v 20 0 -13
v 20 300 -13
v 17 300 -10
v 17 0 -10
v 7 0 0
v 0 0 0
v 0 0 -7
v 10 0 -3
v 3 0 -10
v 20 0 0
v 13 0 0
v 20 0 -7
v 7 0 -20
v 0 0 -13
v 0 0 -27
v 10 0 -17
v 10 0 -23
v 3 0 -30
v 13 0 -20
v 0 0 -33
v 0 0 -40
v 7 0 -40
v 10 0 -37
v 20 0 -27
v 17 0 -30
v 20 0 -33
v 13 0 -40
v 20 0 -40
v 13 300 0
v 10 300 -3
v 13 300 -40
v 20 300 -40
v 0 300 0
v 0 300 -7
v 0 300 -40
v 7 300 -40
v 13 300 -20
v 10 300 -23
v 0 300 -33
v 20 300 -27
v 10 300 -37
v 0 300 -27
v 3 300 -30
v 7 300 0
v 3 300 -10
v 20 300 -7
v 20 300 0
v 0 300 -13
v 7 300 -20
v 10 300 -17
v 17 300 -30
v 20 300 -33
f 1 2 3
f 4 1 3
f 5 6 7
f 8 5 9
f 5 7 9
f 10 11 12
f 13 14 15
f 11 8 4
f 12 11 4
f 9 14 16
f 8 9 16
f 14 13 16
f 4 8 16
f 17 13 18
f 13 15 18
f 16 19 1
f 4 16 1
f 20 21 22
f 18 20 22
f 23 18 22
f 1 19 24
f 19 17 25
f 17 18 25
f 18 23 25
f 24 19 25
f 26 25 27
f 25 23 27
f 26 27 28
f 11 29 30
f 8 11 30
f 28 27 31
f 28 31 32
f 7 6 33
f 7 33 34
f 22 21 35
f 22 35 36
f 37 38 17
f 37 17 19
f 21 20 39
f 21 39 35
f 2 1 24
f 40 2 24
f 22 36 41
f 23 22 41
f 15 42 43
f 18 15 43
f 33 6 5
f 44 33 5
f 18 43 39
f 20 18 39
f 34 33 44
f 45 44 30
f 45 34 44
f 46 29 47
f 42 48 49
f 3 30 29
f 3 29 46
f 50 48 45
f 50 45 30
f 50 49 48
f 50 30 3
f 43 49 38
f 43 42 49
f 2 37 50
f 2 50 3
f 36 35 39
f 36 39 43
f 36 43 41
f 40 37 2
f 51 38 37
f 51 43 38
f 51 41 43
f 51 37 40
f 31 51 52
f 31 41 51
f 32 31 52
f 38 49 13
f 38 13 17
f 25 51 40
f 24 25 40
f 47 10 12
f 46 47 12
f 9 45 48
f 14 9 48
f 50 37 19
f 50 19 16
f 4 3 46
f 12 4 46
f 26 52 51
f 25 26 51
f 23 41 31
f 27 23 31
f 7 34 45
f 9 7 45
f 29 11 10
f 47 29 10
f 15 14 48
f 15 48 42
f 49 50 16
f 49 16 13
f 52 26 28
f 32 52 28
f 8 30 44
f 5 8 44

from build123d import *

# Parameters (mm, degrees)
SKIZZE1_W                       = 20
SKIZZE1_H                       = 40
AUFSATZ_LINEAR_AUSTRAGEN1_DEPTH = 300
SCHNITT_LINEAR_AUSTRAGEN1_DEPTH = 304.315017762


with BuildPart() as part:
    # Skizze1 → Aufsatz-Linear austragen1 (new body)
    with BuildSketch(Plane(origin=(0, 0, 0), x_dir=(1, 0, 0), z_dir=(0, 1, 0))):
        with Locations((10, 20)):
            Rectangle(SKIZZE1_W, SKIZZE1_H)
    extrude(amount=AUFSATZ_LINEAR_AUSTRAGEN1_DEPTH)

    # Skizze2 → Schnitt-Linear austragen1 (cut, through all)
    with BuildSketch(Plane(origin=(0, 300, 0), x_dir=(1, 0, 0), z_dir=(0, 1, 0))):
        Polygon((3, 30), (0, 33), (0, 27), align=None)
        Polygon((13, 40), (7, 40), (10, 37), align=None)
        Polygon((20, 27), (20, 33), (17, 30), align=None)
        Polygon((13, 20), (10, 17), (7, 20), align=None)
        Polygon((7, 20), (10, 23), (13, 20), align=None)
        Polygon((20, 7), (20, 13), (17, 10), align=None)
        Polygon((3, 10), (0, 13), (0, 7), align=None)
        Polygon((10, 3), (7, 0), (13, 0), align=None)
    extrude(amount=-SCHNITT_LINEAR_AUSTRAGEN1_DEPTH, mode=Mode.SUBTRACT)


solid = part.part
